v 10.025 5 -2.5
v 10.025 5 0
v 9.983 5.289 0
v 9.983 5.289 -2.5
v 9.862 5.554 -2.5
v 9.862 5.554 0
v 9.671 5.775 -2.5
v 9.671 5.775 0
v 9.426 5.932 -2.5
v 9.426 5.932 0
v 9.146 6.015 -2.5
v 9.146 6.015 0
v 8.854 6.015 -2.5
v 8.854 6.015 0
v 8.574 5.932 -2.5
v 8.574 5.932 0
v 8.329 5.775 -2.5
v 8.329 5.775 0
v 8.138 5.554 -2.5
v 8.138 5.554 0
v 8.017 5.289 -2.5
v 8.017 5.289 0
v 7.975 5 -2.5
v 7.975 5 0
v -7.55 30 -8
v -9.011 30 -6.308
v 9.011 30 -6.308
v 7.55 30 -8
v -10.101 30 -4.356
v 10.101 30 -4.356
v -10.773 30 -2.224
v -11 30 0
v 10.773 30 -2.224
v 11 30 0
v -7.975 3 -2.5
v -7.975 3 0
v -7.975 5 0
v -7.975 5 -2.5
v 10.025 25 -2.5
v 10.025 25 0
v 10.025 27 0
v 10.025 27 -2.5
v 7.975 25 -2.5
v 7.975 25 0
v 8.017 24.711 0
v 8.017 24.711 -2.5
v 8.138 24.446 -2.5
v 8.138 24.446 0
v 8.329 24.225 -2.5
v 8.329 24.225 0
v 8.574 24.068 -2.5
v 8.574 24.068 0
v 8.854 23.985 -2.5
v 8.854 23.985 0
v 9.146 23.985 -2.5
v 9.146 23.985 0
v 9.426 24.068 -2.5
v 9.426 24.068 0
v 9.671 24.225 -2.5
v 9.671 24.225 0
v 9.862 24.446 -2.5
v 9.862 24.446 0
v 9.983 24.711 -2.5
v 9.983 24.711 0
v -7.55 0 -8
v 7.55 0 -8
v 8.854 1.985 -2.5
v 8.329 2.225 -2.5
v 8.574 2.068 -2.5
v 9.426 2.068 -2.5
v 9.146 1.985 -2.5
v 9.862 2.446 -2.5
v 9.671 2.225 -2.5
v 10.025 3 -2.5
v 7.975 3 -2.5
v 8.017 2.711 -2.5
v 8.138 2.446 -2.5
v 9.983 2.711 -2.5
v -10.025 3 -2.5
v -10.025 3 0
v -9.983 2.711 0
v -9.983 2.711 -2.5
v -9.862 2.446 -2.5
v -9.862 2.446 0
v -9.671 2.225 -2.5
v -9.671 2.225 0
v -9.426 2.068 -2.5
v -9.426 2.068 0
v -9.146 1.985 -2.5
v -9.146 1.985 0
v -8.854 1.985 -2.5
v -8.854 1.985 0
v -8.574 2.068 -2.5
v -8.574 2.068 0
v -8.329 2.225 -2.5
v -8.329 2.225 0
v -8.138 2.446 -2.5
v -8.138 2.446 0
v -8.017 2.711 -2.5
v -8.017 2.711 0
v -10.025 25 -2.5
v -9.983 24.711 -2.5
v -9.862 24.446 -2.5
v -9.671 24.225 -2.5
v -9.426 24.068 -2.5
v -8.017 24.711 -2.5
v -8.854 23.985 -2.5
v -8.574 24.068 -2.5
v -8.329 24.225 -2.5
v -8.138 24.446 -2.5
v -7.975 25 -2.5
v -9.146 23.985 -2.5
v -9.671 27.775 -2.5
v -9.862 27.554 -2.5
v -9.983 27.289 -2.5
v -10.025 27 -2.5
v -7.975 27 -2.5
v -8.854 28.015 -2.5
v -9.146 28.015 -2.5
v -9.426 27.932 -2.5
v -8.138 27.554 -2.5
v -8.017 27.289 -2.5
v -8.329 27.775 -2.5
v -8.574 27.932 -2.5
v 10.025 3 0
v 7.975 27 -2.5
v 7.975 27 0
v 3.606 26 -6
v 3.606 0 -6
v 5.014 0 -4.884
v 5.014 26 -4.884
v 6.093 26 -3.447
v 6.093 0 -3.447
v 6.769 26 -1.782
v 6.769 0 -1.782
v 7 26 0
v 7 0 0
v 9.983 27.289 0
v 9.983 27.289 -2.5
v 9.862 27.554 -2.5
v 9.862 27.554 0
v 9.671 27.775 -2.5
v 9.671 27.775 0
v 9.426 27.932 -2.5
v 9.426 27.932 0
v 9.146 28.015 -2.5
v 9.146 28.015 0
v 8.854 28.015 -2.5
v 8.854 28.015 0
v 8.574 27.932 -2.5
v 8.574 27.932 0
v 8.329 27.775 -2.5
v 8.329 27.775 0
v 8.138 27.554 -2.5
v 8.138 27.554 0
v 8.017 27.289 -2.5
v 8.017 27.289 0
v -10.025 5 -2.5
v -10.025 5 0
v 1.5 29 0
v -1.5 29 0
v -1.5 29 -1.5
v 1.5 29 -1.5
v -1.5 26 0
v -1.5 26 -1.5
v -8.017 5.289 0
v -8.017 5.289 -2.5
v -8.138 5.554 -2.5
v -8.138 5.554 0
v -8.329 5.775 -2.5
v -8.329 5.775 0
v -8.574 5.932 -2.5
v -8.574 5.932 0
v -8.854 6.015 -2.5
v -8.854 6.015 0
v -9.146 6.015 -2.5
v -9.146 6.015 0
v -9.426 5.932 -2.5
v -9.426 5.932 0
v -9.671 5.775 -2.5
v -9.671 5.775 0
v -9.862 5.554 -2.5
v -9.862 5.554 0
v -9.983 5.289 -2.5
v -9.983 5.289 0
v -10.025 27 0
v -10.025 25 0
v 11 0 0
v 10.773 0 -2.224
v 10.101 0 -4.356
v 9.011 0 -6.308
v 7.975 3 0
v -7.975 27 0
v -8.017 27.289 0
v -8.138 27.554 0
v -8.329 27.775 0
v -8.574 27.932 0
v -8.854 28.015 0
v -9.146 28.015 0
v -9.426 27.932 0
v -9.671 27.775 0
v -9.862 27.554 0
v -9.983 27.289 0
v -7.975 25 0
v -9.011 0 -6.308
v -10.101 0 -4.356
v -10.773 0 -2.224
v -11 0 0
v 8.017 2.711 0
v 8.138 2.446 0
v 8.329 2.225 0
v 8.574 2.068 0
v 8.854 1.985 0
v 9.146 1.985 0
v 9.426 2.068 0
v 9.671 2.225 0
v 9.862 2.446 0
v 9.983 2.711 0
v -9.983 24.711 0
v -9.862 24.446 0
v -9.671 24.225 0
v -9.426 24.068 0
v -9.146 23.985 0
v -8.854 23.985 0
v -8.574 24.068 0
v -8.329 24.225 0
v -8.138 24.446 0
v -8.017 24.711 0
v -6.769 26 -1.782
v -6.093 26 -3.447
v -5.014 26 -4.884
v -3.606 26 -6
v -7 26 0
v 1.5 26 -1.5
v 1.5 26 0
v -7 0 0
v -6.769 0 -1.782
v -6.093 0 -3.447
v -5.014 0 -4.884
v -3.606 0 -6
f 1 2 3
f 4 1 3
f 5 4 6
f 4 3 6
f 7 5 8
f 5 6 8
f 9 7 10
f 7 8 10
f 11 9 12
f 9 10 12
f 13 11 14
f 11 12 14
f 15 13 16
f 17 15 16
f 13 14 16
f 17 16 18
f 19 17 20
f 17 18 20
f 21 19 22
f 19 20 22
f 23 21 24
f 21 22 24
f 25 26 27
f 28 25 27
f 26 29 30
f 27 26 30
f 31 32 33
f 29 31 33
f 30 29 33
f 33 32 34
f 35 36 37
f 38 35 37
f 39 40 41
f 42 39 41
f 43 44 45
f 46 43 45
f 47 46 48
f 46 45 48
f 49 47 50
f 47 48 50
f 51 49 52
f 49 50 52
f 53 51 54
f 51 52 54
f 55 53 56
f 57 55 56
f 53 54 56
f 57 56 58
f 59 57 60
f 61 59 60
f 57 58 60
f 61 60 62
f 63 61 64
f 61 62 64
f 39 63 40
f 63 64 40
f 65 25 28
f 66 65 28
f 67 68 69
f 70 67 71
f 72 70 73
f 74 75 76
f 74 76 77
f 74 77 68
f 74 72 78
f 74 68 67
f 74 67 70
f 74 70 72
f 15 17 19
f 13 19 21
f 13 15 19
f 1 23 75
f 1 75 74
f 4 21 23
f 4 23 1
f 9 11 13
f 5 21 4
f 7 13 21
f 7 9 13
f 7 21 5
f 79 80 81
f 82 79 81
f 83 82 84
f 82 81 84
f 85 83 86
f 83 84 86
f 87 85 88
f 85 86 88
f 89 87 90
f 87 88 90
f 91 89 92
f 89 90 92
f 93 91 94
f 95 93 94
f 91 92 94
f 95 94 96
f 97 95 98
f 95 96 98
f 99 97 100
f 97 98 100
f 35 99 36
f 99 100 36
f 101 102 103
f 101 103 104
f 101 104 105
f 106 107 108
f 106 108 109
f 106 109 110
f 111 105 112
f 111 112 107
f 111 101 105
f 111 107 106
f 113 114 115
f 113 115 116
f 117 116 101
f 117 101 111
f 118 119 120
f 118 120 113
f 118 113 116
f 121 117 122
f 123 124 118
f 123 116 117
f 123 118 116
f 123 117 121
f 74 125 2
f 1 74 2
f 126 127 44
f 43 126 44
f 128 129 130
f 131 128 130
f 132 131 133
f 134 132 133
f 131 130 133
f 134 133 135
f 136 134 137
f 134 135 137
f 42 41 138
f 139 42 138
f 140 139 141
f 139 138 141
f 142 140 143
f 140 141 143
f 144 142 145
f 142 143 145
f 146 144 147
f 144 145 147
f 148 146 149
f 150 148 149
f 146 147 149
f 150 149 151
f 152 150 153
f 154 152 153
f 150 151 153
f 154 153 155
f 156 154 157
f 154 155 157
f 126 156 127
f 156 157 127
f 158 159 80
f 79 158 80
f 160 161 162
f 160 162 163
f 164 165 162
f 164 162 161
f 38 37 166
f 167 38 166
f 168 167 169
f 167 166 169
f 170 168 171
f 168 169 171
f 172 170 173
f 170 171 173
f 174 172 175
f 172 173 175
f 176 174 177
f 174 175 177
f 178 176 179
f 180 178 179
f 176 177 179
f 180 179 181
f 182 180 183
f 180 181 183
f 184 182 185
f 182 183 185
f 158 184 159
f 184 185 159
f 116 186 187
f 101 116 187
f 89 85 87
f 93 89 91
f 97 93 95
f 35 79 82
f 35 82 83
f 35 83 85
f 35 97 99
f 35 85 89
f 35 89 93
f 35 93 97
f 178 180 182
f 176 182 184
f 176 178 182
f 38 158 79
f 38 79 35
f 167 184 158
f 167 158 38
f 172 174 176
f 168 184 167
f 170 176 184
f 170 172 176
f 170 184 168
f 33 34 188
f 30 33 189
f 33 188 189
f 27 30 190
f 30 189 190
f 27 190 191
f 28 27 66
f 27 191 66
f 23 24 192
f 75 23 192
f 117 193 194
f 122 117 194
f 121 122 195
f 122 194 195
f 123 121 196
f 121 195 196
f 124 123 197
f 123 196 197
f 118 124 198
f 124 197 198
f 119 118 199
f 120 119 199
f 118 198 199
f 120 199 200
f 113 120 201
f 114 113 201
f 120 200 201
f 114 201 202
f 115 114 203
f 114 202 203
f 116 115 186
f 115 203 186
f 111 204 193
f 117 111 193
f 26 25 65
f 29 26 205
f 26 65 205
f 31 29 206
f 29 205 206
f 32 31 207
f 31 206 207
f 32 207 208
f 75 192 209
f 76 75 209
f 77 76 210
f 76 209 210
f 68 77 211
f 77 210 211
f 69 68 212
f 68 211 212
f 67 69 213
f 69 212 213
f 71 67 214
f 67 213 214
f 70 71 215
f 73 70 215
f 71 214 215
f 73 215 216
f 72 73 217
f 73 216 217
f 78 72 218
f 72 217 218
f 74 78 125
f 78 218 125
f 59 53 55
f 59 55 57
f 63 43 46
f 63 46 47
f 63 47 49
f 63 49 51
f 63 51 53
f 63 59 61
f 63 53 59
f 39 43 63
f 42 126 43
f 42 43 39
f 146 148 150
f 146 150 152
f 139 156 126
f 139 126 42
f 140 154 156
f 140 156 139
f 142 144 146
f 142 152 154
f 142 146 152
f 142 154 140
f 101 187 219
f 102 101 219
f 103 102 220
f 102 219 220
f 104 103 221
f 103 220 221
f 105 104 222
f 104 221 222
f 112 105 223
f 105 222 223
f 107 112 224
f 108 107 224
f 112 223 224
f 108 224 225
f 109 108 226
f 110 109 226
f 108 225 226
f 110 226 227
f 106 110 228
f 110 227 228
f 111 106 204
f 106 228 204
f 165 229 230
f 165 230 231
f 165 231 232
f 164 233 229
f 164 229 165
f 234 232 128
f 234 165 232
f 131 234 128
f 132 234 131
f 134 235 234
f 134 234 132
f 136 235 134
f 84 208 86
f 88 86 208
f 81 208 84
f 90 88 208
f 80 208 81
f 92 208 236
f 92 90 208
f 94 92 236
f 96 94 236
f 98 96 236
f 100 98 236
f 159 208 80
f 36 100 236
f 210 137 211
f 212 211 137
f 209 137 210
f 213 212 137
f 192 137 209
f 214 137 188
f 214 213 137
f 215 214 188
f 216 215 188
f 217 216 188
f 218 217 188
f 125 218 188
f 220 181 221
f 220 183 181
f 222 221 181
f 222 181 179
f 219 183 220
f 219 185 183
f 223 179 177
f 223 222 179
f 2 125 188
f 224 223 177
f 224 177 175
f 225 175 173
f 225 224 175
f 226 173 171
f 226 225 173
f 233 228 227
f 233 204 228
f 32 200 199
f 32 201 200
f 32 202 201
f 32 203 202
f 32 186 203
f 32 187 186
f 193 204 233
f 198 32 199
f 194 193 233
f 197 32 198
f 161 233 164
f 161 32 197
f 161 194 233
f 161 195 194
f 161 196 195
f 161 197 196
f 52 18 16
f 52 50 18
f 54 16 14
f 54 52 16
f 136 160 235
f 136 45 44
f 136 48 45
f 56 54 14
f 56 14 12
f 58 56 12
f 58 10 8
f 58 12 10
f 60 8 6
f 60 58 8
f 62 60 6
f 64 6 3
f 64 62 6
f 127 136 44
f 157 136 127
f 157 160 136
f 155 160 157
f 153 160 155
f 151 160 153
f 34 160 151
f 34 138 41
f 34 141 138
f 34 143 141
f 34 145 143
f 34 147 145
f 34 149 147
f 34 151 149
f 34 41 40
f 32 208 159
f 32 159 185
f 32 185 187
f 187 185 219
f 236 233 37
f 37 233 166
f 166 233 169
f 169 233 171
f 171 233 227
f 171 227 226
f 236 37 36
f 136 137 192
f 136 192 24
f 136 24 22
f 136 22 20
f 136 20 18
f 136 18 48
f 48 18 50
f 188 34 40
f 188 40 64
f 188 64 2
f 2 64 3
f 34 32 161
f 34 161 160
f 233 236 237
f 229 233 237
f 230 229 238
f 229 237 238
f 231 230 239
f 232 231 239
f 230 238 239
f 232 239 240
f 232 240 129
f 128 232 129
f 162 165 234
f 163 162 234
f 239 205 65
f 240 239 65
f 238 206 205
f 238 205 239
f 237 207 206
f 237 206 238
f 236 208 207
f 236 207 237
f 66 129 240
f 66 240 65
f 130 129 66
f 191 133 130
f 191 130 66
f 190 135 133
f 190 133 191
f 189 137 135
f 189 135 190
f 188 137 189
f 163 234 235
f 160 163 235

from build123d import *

# Parameters (mm, degrees)
F1_W      = 22
F1_H      = 30
F2_DEPTH  = 8
F4_DEPTH  = 30.001
F6_DEPTH  = 2.5
F8_DEPTH  = 26
F9_W      = 3
F9_H      = 1.5
F10_DEPTH = 3


with BuildPart() as f2:
    # F1 (on Top) → F2 (new body)
    with BuildSketch(Plane.XY):
        with Locations((0, 15)):
            Rectangle(F1_W, F1_H)
    extrude(amount=-F2_DEPTH)

    # F3 (on face) → F4 (cut, through all)
    with BuildSketch(Plane.XZ):
        with BuildLine():
            Line((11, -8), (11, 0))
            ThreePointArc((11, 0), (10.100697, -4.356135), (7.549834, -8))
            Line((7.549834, -8), (11, -8))
        make_face()
        with BuildLine():
            ThreePointArc((-7.549834, -8), (-10.100697, -4.356135), (-11, 0))
            Line((-11, 0), (-11, -8))
            Line((-11, -8), (-7.549834, -8))
        make_face()
    extrude(amount=-F4_DEPTH, mode=Mode.SUBTRACT)

    # F5 (on face) → F6 (cut)
    with BuildSketch(Plane.XY):
        with BuildLine():
            ThreePointArc((-7.975, 5), (-9, 6.025), (-10.025, 5))
            Line((-10.025, 5), (-10.025, 3))
            ThreePointArc((-10.025, 3), (-9, 1.975), (-7.975, 3))
            Line((-7.975, 3), (-7.975, 5))
        make_face()
        with BuildLine():
            ThreePointArc((10.025, 5), (9, 6.025), (7.975, 5))
            Line((7.975, 5), (7.975, 3))
            ThreePointArc((7.975, 3), (9, 1.975), (10.025, 3))
            Line((10.025, 3), (10.025, 5))
        make_face()
        with BuildLine():
            ThreePointArc((-7.975, 27), (-9, 28.025), (-10.025, 27))
            Line((-10.025, 27), (-10.025, 25))
            ThreePointArc((-10.025, 25), (-9, 23.975), (-7.975, 25))
            Line((-7.975, 25), (-7.975, 27))
        make_face()
        with BuildLine():
            ThreePointArc((10.025, 27), (9, 28.025), (7.975, 27))
            Line((7.975, 27), (7.975, 25))
            ThreePointArc((7.975, 25), (9, 23.975), (10.025, 25))
            Line((10.025, 25), (10.025, 27))
        make_face()
    extrude(amount=-F6_DEPTH, mode=Mode.SUBTRACT)

    # F7 (on face) → F8 (cut)
    with BuildSketch(Plane.XZ):
        with BuildLine():
            Line((7, 0), (-7, 0))
            ThreePointArc((-7, 0), (-6.092572, -3.44682), (-3.605551, -6))
            Line((-3.605551, -6), (3.605551, -6))
            ThreePointArc((3.605551, -6), (6.092572, -3.44682), (7, 0))
        make_face()
    extrude(amount=-F8_DEPTH, mode=Mode.SUBTRACT)

    # F9 (on face) → F10 (cut)
    with BuildSketch(Plane.XZ.offset(-26)):
        with Locations((0, -0.75)):
            Rectangle(F9_W, F9_H)
    extrude(amount=-F10_DEPTH, mode=Mode.SUBTRACT)


solid = f2.part
